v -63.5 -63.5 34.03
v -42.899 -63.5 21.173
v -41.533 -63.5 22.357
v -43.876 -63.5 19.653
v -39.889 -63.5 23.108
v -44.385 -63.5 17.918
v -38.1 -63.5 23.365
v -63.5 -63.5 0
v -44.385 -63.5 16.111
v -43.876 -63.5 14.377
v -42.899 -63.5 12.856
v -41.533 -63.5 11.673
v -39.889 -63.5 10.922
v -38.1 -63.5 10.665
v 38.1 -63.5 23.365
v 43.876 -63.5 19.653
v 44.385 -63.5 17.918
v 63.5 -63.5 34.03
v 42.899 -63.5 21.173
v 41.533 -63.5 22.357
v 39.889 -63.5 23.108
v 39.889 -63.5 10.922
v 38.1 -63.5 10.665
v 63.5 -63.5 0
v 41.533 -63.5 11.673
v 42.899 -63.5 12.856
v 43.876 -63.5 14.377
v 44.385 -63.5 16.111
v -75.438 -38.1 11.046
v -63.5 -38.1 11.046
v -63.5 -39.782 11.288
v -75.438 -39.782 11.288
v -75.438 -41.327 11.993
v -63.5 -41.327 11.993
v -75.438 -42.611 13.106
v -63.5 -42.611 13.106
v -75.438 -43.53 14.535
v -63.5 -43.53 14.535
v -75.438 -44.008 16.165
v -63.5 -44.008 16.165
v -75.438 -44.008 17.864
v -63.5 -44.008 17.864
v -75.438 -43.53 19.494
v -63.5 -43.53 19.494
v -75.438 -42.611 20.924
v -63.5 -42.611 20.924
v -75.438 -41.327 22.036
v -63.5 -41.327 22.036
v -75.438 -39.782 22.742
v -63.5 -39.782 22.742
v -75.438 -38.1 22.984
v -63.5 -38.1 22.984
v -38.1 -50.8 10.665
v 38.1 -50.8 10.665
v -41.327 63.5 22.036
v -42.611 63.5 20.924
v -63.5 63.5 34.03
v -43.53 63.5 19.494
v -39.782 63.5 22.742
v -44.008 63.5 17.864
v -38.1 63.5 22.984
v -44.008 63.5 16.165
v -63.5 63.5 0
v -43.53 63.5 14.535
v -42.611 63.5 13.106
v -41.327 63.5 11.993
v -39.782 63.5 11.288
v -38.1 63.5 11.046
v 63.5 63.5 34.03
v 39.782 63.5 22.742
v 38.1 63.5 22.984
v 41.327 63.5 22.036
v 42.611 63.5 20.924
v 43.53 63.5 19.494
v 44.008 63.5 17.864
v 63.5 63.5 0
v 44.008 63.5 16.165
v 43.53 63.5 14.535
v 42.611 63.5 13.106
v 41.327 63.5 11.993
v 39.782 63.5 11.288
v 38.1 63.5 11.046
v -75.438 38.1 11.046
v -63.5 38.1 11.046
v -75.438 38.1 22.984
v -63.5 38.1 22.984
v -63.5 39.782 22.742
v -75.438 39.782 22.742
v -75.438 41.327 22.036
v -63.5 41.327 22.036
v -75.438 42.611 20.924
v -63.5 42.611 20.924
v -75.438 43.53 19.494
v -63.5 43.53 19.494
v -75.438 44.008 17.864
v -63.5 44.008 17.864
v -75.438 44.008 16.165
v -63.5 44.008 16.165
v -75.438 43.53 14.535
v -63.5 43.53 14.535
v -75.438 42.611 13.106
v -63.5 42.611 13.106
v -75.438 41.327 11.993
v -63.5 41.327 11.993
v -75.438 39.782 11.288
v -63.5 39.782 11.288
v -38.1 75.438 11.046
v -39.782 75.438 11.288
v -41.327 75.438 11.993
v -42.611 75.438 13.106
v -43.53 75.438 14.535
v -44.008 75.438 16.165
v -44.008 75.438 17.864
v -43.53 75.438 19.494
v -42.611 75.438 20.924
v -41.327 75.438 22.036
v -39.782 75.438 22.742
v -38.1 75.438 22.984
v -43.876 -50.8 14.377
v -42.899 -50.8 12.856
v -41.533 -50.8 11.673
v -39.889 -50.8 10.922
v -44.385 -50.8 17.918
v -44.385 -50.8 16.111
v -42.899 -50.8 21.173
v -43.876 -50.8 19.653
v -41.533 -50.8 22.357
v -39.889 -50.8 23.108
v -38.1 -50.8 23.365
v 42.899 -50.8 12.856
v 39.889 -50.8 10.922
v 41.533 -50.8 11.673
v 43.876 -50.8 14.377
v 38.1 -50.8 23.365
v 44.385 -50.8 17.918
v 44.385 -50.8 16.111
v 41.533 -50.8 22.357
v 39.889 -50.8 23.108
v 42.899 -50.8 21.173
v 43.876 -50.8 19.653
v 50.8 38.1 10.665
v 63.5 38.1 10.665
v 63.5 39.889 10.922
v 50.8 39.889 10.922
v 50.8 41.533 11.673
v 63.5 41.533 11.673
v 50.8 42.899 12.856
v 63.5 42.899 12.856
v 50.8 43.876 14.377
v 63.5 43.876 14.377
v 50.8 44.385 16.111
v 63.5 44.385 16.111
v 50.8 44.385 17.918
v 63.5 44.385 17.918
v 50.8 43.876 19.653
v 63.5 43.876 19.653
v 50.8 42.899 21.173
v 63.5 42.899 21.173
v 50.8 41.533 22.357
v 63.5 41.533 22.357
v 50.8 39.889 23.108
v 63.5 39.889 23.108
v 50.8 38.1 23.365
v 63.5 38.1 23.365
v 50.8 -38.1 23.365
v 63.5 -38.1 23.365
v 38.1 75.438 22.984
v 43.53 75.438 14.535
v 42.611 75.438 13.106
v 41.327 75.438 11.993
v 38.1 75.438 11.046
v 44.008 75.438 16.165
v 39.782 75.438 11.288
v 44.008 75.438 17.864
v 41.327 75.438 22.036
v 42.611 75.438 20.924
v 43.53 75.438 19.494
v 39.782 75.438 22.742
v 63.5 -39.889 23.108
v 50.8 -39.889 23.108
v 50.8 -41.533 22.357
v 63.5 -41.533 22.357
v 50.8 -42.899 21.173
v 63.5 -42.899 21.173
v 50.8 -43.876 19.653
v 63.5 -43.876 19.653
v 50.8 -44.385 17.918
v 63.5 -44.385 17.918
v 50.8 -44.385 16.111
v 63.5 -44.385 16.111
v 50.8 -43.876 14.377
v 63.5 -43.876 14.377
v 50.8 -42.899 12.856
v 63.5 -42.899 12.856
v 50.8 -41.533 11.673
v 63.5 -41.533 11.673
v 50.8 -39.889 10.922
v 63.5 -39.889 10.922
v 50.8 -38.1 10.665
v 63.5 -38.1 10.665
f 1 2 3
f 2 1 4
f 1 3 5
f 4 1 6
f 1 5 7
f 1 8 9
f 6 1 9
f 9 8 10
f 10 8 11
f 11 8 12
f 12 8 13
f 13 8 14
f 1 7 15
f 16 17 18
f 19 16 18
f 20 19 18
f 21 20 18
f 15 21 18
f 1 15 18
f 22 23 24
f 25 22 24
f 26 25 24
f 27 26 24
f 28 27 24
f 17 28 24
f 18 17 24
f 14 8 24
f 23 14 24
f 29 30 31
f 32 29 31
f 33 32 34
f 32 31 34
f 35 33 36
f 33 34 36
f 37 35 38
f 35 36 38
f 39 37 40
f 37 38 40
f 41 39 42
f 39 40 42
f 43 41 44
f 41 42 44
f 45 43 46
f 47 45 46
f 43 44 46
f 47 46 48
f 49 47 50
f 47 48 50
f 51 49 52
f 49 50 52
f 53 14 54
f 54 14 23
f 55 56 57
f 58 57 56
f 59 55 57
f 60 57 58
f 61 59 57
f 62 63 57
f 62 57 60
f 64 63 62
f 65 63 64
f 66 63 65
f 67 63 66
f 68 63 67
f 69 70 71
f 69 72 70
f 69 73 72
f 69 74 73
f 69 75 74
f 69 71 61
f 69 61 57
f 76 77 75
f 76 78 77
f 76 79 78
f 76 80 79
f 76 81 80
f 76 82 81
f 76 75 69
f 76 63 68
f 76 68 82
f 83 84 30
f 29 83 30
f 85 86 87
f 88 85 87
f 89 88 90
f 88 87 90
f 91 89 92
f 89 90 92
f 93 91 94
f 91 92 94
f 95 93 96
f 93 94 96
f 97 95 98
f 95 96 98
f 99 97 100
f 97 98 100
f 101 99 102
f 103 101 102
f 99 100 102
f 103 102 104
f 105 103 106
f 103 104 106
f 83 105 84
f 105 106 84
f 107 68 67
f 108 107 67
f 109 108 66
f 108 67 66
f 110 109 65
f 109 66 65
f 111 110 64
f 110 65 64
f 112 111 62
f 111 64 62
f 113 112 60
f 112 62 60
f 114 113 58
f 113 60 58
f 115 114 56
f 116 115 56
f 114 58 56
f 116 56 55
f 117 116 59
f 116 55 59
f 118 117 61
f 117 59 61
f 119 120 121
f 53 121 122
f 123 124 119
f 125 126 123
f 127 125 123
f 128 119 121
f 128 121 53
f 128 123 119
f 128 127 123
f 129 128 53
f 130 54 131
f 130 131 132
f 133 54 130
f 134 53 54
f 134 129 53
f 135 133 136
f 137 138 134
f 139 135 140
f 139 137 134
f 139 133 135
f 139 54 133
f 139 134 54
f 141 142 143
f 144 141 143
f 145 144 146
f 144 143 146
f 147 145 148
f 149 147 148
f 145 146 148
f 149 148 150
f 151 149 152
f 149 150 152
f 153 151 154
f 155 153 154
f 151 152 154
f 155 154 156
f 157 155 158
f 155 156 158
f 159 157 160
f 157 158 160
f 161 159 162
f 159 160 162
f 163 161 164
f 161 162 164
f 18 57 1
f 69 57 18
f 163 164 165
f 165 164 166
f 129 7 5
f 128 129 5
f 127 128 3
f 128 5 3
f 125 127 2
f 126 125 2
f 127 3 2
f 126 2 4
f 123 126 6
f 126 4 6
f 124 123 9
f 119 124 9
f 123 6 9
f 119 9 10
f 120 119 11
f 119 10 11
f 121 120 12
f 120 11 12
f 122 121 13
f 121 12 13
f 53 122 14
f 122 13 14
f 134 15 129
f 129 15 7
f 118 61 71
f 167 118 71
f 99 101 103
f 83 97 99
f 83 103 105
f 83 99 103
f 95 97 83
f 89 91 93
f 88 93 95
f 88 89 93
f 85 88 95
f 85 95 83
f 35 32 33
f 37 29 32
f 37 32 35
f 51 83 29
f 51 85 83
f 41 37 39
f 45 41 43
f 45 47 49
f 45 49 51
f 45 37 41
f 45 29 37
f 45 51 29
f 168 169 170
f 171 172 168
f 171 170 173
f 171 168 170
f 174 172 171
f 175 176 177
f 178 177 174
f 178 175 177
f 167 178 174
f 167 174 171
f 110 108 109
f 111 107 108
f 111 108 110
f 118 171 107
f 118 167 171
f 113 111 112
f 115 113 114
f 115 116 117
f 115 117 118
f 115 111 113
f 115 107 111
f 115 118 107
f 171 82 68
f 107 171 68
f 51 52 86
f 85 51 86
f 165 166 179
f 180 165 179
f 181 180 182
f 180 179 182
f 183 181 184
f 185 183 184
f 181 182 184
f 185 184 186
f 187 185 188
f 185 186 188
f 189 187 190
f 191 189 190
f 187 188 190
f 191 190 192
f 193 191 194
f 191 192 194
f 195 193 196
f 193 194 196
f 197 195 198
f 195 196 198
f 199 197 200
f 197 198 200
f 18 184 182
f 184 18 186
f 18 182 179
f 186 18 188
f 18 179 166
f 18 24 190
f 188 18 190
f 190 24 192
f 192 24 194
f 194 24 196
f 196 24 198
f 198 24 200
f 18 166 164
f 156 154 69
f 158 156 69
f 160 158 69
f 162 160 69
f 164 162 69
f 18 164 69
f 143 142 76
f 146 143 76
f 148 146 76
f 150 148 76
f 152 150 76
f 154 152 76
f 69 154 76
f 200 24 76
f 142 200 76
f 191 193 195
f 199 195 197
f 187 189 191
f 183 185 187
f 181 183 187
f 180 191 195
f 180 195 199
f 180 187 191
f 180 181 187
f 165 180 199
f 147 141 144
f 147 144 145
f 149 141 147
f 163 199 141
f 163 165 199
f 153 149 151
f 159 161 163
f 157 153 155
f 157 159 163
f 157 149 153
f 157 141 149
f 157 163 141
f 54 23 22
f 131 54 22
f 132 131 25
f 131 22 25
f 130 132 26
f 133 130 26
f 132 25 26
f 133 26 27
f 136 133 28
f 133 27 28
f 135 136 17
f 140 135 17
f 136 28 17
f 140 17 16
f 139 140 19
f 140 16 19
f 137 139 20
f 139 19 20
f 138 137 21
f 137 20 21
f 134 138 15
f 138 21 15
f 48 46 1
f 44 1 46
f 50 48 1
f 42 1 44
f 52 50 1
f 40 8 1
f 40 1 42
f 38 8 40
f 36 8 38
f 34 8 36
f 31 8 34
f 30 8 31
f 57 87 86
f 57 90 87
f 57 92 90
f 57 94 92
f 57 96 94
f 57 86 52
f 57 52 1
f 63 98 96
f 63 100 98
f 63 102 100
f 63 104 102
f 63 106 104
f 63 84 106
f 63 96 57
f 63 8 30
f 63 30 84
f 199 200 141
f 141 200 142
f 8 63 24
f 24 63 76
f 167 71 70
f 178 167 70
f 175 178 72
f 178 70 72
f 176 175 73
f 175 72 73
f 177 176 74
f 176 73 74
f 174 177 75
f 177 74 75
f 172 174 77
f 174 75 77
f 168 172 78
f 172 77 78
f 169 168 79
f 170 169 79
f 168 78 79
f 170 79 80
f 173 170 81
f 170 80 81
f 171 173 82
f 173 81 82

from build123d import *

# Parameters (mm, degrees)
F0_W     = 127
F0_H     = 127
F1_DEPTH = 34.029548
F3_DEPTH = 11.938
F6_DEPTH = 12.7
F7_DEPTH = 12.7
F9_DEPTH = 11.938


with BuildPart() as f1:
    # F0 (on Top) → F1 (new body)
    with BuildSketch(Plane.XY):
        Rectangle(F0_W, F0_H)
    extrude(amount=F1_DEPTH)

    # F2 (on face) → F3 (join)
    with BuildSketch(Plane(origin=(0, 63.5, 0), x_dir=(-1, 0, 0), z_dir=(0, 1, 0))):
        with BuildLine():
            ThreePointArc((-38.1, 22.983774), (-44.069, 17.014774), (-38.1, 11.045774))
            Line((-38.1, 11.045774), (38.1, 11.045774))
            ThreePointArc((38.1, 11.045774), (44.069, 17.014774), (38.1, 22.983774))
            Line((38.1, 22.983774), (-38.1, 22.983774))
        make_face()
    extrude(amount=F3_DEPTH)

    # F4 (on face) → F6 (cut)
    with BuildSketch(Plane.XZ.offset(63.5)):
        with BuildLine():
            ThreePointArc((-38.1, 23.364774), (-44.45, 17.014774), (-38.1, 10.664774))
            Line((-38.1, 10.664774), (38.1, 10.664774))
            ThreePointArc((38.1, 10.664774), (44.45, 17.014774), (38.1, 23.364774))
            Line((38.1, 23.364774), (-38.1, 23.364774))
        make_face()
    extrude(amount=-F6_DEPTH, mode=Mode.SUBTRACT)

    # F5 (on face) → F7 (cut)
    with BuildSketch(Plane.YZ.offset(63.5)):
        with BuildLine():
            ThreePointArc((-38.1, 23.364774), (-44.45, 17.014774), (-38.1, 10.664774))
            Line((-38.1, 10.664774), (38.1, 10.664774))
            ThreePointArc((38.1, 10.664774), (44.45, 17.014774), (38.1, 23.364774))
            Line((38.1, 23.364774), (-38.1, 23.364774))
        make_face()
    extrude(amount=-F7_DEPTH, mode=Mode.SUBTRACT)

    # F8 (on face) → F9 (join)
    with BuildSketch(Plane(origin=(-63.5, 0, 0), x_dir=(0, -1, 0), z_dir=(-1, 0, 0))):
        with BuildLine():
            ThreePointArc((-38.1, 22.983774), (-44.069, 17.014774), (-38.1, 11.045774))
            Line((-38.1, 11.045774), (38.1, 11.045774))
            ThreePointArc((38.1, 11.045774), (44.069, 17.014774), (38.1, 22.983774))
            Line((38.1, 22.983774), (-38.1, 22.983774))
        make_face()
    extrude(amount=F9_DEPTH)


solid = f1.part
